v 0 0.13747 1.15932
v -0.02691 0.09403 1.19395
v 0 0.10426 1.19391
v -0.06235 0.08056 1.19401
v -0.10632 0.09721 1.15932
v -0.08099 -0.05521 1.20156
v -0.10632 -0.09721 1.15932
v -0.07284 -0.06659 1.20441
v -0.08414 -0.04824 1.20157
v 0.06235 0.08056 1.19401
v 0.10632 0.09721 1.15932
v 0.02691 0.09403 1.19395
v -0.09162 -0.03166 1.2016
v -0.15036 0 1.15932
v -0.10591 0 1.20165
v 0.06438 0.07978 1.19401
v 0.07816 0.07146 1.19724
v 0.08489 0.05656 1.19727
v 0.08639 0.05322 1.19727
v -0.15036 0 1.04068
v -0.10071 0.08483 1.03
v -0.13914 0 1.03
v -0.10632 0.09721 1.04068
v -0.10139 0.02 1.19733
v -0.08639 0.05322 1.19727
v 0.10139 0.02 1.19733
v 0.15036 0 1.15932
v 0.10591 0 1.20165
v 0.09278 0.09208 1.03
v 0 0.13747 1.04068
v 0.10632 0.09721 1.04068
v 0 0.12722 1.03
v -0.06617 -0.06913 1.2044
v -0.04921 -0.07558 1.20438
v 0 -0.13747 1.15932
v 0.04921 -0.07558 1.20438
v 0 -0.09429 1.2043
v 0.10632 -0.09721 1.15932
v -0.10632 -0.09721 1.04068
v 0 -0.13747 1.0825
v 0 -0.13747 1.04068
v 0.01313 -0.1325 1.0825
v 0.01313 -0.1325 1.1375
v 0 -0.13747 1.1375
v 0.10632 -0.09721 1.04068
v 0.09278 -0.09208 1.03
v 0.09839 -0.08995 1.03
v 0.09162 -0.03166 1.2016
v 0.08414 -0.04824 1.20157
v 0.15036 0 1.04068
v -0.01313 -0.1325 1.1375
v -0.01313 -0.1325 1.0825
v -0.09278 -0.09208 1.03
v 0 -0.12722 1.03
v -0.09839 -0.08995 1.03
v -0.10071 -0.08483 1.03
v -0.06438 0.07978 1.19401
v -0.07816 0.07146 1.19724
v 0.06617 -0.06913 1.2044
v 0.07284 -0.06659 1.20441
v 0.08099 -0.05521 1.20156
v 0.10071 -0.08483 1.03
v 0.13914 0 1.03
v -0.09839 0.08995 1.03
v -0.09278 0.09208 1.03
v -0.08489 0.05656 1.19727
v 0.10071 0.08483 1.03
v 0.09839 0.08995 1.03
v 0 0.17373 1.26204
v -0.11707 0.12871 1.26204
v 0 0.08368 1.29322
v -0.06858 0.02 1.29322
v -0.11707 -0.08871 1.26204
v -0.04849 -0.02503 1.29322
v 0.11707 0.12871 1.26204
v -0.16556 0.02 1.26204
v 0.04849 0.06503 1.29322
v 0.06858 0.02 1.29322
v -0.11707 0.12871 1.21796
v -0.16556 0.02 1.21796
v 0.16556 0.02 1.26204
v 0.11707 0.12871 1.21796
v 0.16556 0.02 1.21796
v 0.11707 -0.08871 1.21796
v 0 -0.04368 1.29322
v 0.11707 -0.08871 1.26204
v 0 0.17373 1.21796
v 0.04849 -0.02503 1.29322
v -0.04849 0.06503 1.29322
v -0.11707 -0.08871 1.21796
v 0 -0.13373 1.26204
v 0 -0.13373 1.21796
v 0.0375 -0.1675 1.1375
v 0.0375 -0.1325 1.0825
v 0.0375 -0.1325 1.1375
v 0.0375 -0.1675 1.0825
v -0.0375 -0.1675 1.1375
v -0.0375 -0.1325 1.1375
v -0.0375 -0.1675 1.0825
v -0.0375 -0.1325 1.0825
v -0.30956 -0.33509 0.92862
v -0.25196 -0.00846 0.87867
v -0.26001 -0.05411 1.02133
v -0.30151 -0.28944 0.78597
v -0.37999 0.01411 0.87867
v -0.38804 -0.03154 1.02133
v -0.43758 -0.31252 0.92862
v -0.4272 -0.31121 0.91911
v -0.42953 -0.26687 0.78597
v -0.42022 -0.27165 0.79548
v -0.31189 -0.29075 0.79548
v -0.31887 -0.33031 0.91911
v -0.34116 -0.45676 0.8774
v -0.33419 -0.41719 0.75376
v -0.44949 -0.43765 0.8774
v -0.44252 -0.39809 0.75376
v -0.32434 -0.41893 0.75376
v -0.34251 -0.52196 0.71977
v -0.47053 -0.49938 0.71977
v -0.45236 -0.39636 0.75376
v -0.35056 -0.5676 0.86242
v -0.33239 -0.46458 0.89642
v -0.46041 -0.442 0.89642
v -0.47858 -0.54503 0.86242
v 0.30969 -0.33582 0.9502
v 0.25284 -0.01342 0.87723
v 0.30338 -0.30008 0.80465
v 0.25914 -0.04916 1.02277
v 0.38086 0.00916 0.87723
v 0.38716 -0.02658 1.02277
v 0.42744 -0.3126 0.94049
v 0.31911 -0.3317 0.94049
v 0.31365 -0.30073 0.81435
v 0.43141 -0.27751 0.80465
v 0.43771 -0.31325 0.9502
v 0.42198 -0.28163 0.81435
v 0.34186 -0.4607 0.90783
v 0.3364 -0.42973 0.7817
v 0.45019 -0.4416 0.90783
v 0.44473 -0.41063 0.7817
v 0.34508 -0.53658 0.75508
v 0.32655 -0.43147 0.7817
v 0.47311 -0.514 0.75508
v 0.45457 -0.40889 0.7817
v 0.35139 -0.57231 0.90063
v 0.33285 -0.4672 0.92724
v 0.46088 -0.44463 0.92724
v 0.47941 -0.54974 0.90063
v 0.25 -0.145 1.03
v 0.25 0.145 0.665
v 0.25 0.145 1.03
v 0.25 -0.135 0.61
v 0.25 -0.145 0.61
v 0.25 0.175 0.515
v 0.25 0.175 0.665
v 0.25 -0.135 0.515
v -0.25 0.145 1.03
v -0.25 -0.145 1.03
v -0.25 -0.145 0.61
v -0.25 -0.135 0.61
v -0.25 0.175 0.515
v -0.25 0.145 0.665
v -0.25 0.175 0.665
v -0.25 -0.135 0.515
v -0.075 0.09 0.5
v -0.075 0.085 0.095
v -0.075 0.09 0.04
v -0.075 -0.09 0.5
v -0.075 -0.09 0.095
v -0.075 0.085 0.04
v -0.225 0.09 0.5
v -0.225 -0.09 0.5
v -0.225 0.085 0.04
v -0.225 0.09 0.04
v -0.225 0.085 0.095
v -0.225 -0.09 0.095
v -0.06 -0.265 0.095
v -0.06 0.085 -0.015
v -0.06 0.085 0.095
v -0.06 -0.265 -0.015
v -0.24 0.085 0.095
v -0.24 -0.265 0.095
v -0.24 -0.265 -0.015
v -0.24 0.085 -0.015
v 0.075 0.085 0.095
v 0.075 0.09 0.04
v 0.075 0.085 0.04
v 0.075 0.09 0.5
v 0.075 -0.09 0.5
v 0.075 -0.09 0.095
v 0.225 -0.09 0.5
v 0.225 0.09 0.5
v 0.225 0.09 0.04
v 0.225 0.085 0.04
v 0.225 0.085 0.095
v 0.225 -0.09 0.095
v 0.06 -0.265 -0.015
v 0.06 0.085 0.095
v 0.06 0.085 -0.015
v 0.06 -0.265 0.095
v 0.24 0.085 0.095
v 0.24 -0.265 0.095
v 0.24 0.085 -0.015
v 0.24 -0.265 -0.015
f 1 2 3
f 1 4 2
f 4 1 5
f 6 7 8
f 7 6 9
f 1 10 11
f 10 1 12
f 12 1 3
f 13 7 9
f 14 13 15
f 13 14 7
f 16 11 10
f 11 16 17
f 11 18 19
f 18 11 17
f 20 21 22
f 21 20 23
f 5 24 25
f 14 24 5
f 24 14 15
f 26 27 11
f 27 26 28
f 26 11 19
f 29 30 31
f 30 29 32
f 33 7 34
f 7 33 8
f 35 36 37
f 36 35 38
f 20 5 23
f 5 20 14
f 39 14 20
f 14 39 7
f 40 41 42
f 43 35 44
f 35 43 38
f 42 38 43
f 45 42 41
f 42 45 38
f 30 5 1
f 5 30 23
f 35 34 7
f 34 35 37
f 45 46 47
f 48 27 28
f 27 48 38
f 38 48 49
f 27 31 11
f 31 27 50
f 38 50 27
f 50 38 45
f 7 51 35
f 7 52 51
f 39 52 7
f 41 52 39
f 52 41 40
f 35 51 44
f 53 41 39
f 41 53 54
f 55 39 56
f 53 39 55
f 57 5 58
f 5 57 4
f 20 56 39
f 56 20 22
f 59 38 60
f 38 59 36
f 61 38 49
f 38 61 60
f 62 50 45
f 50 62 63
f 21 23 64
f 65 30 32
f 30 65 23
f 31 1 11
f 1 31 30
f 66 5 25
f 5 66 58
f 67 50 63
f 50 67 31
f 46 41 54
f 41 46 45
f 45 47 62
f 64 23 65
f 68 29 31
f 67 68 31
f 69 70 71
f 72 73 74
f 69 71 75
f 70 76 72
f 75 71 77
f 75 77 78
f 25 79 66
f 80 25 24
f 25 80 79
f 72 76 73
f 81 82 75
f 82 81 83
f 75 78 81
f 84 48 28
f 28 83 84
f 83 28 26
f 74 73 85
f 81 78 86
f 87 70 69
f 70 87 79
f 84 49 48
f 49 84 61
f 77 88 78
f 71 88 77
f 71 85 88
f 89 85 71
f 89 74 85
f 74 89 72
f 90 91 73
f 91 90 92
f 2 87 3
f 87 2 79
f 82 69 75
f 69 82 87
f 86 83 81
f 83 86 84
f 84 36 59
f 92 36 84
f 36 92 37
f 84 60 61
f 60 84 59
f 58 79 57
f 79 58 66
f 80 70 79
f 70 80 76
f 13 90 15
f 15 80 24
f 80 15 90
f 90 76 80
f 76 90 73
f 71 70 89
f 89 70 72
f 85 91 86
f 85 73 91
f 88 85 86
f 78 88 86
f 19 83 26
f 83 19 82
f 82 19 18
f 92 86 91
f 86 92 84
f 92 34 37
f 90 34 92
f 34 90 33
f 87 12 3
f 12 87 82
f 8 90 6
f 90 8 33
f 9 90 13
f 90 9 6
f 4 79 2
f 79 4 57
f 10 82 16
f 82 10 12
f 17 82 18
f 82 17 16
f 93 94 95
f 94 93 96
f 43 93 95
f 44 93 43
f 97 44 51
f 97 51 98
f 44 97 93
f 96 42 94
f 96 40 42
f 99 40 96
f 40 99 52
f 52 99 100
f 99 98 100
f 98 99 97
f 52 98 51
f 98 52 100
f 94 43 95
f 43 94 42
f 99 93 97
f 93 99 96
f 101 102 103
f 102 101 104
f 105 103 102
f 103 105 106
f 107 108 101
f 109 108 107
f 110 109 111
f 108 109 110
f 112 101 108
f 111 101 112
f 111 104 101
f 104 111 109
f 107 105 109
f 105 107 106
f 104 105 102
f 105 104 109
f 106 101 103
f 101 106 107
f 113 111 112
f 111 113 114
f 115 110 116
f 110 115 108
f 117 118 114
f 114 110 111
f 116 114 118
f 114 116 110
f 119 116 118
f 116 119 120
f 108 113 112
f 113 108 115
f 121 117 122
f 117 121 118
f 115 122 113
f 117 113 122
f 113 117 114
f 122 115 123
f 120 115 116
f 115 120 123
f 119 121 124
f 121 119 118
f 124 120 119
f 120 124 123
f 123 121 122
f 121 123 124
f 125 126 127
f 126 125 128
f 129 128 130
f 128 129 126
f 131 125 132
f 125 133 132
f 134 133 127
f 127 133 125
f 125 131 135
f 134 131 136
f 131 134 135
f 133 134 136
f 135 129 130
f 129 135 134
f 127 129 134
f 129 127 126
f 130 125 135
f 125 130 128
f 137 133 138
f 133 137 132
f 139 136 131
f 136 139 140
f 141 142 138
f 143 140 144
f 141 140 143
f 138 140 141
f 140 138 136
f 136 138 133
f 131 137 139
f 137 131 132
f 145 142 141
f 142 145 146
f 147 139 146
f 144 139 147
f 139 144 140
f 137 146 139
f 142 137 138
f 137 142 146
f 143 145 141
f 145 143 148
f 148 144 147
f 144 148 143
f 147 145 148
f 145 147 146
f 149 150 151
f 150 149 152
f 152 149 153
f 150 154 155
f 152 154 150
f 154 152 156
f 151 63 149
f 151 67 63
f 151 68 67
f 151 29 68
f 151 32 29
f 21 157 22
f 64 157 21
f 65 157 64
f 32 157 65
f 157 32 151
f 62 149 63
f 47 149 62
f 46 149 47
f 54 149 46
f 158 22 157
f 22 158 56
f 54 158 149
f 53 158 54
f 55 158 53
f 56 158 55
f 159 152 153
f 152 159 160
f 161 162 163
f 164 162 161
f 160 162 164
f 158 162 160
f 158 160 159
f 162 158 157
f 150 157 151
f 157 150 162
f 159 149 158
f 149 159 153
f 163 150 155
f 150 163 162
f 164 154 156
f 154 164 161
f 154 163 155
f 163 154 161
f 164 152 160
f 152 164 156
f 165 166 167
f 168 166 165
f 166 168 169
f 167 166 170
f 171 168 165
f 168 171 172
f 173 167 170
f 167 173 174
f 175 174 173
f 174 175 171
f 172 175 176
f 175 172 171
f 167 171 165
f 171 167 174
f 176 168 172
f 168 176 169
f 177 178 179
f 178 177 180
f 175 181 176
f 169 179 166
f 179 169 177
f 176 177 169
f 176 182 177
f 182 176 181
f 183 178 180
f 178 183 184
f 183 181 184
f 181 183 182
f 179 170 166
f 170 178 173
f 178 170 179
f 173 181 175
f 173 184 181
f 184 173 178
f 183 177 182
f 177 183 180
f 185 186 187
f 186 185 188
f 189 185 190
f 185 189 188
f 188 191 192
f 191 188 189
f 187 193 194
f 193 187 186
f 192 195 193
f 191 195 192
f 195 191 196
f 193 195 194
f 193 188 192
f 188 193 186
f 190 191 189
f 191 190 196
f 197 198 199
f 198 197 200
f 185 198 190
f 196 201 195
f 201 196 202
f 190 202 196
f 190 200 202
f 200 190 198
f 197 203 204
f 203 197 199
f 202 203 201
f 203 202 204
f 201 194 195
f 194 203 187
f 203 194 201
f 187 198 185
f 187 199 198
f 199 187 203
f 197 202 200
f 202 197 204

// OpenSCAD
// ============================================================================
// brotato_player.scad - compact ScadRig hero for Brotato3D.
//
// The rig faces -Y in SCAD space (engine +Z). The gameplay driver rotates the
// world/root toward movement and twists bone_torso toward the current aim.
// ROLECOLOR is replaced with the selected character colour at runtime.
// ============================================================================

$fn = 8;

ROLECOLOR = [1, 0, 1];
SKIN = [0.92, 0.70, 0.48];
PANTS = [0.12, 0.15, 0.22];
BOOT = [0.055, 0.06, 0.075];
GLOVE = [0.11, 0.12, 0.14];

module part_leg()
{
    color(PANTS) translate([0, 0, -0.23]) cube([0.15, 0.18, 0.46], center = true);
    color(BOOT) translate([0, -0.09, -0.46]) cube([0.18, 0.35, 0.11], center = true);
}

module part_arm()
{
    color(ROLECOLOR) translate([0, 0, -0.15]) cube([0.13, 0.15, 0.30], center = true);
    color(SKIN) translate([0, 0, -0.37]) cube([0.11, 0.13, 0.18], center = true);
    color(GLOVE) translate([0, -0.01, -0.49]) cube([0.13, 0.15, 0.11], center = true);
}

module bone_head()
{
    color(SKIN) scale([1.05, 0.96, 1.0]) sphere(r = 0.155);
    color(ROLECOLOR) translate([0, 0.02, 0.14]) scale([1.12, 1.04, 0.36]) sphere(r = 0.16);
    color(GLOVE) translate([0, -0.15, 0.01]) cube([0.075, 0.035, 0.055], center = true);
}

module bone_arm_l() { part_arm(); }
module bone_arm_r() { mirror([1, 0, 0]) part_arm(); }
module bone_leg_l() { part_leg(); }
module bone_leg_r() { mirror([1, 0, 0]) part_leg(); }

module bone_torso()
{
    color(ROLECOLOR) translate([0, 0, 0.21]) cube([0.50, 0.29, 0.42], center = true);
    color(PANTS) translate([0, 0.02, -0.02]) cube([0.50, 0.31, 0.15], center = true);
    translate([0, 0, 0.49]) bone_head();

    // Arms are authored in a compact ready pose. The entire upper-body branch
    // follows bone_torso when gameplay applies the aim-relative yaw.
    translate([-0.32, -0.02, 0.34]) rotate([-72, 0, -10]) bone_arm_l();
    translate([ 0.32, -0.02, 0.34]) rotate([-76, 0,  10]) bone_arm_r();
}

module bone_root()
{
    translate([0, 0, 0.61]) bone_torso();
    translate([-0.15, 0, 0.50]) bone_leg_l();
    translate([ 0.15, 0, 0.50]) bone_leg_r();
}

bone_root();

anim_idle = [
    ["bone_head", "rot", [[0, [0, 0, -2]], [0.8, [0, 0, 2]], [1.6, [0, 0, -2]]]],
];

// Upper-body bones are intentionally absent: gameplay owns their aim pose.
anim_walk = [
    ["bone_leg_l", "rot", [[0, [32, 0, 0]], [0.35, [-32, 0, 0]], [0.7, [32, 0, 0]]]],
    ["bone_leg_r", "rot", [[0, [-32, 0, 0]], [0.35, [32, 0, 0]], [0.7, [-32, 0, 0]]]],
    ["bone_root", "pos", [[0, [0, 0, 0]], [0.175, [0, 0, 0.035]], [0.35, [0, 0, 0]],
                           [0.525, [0, 0, 0.035]], [0.7, [0, 0, 0]]]],
];
